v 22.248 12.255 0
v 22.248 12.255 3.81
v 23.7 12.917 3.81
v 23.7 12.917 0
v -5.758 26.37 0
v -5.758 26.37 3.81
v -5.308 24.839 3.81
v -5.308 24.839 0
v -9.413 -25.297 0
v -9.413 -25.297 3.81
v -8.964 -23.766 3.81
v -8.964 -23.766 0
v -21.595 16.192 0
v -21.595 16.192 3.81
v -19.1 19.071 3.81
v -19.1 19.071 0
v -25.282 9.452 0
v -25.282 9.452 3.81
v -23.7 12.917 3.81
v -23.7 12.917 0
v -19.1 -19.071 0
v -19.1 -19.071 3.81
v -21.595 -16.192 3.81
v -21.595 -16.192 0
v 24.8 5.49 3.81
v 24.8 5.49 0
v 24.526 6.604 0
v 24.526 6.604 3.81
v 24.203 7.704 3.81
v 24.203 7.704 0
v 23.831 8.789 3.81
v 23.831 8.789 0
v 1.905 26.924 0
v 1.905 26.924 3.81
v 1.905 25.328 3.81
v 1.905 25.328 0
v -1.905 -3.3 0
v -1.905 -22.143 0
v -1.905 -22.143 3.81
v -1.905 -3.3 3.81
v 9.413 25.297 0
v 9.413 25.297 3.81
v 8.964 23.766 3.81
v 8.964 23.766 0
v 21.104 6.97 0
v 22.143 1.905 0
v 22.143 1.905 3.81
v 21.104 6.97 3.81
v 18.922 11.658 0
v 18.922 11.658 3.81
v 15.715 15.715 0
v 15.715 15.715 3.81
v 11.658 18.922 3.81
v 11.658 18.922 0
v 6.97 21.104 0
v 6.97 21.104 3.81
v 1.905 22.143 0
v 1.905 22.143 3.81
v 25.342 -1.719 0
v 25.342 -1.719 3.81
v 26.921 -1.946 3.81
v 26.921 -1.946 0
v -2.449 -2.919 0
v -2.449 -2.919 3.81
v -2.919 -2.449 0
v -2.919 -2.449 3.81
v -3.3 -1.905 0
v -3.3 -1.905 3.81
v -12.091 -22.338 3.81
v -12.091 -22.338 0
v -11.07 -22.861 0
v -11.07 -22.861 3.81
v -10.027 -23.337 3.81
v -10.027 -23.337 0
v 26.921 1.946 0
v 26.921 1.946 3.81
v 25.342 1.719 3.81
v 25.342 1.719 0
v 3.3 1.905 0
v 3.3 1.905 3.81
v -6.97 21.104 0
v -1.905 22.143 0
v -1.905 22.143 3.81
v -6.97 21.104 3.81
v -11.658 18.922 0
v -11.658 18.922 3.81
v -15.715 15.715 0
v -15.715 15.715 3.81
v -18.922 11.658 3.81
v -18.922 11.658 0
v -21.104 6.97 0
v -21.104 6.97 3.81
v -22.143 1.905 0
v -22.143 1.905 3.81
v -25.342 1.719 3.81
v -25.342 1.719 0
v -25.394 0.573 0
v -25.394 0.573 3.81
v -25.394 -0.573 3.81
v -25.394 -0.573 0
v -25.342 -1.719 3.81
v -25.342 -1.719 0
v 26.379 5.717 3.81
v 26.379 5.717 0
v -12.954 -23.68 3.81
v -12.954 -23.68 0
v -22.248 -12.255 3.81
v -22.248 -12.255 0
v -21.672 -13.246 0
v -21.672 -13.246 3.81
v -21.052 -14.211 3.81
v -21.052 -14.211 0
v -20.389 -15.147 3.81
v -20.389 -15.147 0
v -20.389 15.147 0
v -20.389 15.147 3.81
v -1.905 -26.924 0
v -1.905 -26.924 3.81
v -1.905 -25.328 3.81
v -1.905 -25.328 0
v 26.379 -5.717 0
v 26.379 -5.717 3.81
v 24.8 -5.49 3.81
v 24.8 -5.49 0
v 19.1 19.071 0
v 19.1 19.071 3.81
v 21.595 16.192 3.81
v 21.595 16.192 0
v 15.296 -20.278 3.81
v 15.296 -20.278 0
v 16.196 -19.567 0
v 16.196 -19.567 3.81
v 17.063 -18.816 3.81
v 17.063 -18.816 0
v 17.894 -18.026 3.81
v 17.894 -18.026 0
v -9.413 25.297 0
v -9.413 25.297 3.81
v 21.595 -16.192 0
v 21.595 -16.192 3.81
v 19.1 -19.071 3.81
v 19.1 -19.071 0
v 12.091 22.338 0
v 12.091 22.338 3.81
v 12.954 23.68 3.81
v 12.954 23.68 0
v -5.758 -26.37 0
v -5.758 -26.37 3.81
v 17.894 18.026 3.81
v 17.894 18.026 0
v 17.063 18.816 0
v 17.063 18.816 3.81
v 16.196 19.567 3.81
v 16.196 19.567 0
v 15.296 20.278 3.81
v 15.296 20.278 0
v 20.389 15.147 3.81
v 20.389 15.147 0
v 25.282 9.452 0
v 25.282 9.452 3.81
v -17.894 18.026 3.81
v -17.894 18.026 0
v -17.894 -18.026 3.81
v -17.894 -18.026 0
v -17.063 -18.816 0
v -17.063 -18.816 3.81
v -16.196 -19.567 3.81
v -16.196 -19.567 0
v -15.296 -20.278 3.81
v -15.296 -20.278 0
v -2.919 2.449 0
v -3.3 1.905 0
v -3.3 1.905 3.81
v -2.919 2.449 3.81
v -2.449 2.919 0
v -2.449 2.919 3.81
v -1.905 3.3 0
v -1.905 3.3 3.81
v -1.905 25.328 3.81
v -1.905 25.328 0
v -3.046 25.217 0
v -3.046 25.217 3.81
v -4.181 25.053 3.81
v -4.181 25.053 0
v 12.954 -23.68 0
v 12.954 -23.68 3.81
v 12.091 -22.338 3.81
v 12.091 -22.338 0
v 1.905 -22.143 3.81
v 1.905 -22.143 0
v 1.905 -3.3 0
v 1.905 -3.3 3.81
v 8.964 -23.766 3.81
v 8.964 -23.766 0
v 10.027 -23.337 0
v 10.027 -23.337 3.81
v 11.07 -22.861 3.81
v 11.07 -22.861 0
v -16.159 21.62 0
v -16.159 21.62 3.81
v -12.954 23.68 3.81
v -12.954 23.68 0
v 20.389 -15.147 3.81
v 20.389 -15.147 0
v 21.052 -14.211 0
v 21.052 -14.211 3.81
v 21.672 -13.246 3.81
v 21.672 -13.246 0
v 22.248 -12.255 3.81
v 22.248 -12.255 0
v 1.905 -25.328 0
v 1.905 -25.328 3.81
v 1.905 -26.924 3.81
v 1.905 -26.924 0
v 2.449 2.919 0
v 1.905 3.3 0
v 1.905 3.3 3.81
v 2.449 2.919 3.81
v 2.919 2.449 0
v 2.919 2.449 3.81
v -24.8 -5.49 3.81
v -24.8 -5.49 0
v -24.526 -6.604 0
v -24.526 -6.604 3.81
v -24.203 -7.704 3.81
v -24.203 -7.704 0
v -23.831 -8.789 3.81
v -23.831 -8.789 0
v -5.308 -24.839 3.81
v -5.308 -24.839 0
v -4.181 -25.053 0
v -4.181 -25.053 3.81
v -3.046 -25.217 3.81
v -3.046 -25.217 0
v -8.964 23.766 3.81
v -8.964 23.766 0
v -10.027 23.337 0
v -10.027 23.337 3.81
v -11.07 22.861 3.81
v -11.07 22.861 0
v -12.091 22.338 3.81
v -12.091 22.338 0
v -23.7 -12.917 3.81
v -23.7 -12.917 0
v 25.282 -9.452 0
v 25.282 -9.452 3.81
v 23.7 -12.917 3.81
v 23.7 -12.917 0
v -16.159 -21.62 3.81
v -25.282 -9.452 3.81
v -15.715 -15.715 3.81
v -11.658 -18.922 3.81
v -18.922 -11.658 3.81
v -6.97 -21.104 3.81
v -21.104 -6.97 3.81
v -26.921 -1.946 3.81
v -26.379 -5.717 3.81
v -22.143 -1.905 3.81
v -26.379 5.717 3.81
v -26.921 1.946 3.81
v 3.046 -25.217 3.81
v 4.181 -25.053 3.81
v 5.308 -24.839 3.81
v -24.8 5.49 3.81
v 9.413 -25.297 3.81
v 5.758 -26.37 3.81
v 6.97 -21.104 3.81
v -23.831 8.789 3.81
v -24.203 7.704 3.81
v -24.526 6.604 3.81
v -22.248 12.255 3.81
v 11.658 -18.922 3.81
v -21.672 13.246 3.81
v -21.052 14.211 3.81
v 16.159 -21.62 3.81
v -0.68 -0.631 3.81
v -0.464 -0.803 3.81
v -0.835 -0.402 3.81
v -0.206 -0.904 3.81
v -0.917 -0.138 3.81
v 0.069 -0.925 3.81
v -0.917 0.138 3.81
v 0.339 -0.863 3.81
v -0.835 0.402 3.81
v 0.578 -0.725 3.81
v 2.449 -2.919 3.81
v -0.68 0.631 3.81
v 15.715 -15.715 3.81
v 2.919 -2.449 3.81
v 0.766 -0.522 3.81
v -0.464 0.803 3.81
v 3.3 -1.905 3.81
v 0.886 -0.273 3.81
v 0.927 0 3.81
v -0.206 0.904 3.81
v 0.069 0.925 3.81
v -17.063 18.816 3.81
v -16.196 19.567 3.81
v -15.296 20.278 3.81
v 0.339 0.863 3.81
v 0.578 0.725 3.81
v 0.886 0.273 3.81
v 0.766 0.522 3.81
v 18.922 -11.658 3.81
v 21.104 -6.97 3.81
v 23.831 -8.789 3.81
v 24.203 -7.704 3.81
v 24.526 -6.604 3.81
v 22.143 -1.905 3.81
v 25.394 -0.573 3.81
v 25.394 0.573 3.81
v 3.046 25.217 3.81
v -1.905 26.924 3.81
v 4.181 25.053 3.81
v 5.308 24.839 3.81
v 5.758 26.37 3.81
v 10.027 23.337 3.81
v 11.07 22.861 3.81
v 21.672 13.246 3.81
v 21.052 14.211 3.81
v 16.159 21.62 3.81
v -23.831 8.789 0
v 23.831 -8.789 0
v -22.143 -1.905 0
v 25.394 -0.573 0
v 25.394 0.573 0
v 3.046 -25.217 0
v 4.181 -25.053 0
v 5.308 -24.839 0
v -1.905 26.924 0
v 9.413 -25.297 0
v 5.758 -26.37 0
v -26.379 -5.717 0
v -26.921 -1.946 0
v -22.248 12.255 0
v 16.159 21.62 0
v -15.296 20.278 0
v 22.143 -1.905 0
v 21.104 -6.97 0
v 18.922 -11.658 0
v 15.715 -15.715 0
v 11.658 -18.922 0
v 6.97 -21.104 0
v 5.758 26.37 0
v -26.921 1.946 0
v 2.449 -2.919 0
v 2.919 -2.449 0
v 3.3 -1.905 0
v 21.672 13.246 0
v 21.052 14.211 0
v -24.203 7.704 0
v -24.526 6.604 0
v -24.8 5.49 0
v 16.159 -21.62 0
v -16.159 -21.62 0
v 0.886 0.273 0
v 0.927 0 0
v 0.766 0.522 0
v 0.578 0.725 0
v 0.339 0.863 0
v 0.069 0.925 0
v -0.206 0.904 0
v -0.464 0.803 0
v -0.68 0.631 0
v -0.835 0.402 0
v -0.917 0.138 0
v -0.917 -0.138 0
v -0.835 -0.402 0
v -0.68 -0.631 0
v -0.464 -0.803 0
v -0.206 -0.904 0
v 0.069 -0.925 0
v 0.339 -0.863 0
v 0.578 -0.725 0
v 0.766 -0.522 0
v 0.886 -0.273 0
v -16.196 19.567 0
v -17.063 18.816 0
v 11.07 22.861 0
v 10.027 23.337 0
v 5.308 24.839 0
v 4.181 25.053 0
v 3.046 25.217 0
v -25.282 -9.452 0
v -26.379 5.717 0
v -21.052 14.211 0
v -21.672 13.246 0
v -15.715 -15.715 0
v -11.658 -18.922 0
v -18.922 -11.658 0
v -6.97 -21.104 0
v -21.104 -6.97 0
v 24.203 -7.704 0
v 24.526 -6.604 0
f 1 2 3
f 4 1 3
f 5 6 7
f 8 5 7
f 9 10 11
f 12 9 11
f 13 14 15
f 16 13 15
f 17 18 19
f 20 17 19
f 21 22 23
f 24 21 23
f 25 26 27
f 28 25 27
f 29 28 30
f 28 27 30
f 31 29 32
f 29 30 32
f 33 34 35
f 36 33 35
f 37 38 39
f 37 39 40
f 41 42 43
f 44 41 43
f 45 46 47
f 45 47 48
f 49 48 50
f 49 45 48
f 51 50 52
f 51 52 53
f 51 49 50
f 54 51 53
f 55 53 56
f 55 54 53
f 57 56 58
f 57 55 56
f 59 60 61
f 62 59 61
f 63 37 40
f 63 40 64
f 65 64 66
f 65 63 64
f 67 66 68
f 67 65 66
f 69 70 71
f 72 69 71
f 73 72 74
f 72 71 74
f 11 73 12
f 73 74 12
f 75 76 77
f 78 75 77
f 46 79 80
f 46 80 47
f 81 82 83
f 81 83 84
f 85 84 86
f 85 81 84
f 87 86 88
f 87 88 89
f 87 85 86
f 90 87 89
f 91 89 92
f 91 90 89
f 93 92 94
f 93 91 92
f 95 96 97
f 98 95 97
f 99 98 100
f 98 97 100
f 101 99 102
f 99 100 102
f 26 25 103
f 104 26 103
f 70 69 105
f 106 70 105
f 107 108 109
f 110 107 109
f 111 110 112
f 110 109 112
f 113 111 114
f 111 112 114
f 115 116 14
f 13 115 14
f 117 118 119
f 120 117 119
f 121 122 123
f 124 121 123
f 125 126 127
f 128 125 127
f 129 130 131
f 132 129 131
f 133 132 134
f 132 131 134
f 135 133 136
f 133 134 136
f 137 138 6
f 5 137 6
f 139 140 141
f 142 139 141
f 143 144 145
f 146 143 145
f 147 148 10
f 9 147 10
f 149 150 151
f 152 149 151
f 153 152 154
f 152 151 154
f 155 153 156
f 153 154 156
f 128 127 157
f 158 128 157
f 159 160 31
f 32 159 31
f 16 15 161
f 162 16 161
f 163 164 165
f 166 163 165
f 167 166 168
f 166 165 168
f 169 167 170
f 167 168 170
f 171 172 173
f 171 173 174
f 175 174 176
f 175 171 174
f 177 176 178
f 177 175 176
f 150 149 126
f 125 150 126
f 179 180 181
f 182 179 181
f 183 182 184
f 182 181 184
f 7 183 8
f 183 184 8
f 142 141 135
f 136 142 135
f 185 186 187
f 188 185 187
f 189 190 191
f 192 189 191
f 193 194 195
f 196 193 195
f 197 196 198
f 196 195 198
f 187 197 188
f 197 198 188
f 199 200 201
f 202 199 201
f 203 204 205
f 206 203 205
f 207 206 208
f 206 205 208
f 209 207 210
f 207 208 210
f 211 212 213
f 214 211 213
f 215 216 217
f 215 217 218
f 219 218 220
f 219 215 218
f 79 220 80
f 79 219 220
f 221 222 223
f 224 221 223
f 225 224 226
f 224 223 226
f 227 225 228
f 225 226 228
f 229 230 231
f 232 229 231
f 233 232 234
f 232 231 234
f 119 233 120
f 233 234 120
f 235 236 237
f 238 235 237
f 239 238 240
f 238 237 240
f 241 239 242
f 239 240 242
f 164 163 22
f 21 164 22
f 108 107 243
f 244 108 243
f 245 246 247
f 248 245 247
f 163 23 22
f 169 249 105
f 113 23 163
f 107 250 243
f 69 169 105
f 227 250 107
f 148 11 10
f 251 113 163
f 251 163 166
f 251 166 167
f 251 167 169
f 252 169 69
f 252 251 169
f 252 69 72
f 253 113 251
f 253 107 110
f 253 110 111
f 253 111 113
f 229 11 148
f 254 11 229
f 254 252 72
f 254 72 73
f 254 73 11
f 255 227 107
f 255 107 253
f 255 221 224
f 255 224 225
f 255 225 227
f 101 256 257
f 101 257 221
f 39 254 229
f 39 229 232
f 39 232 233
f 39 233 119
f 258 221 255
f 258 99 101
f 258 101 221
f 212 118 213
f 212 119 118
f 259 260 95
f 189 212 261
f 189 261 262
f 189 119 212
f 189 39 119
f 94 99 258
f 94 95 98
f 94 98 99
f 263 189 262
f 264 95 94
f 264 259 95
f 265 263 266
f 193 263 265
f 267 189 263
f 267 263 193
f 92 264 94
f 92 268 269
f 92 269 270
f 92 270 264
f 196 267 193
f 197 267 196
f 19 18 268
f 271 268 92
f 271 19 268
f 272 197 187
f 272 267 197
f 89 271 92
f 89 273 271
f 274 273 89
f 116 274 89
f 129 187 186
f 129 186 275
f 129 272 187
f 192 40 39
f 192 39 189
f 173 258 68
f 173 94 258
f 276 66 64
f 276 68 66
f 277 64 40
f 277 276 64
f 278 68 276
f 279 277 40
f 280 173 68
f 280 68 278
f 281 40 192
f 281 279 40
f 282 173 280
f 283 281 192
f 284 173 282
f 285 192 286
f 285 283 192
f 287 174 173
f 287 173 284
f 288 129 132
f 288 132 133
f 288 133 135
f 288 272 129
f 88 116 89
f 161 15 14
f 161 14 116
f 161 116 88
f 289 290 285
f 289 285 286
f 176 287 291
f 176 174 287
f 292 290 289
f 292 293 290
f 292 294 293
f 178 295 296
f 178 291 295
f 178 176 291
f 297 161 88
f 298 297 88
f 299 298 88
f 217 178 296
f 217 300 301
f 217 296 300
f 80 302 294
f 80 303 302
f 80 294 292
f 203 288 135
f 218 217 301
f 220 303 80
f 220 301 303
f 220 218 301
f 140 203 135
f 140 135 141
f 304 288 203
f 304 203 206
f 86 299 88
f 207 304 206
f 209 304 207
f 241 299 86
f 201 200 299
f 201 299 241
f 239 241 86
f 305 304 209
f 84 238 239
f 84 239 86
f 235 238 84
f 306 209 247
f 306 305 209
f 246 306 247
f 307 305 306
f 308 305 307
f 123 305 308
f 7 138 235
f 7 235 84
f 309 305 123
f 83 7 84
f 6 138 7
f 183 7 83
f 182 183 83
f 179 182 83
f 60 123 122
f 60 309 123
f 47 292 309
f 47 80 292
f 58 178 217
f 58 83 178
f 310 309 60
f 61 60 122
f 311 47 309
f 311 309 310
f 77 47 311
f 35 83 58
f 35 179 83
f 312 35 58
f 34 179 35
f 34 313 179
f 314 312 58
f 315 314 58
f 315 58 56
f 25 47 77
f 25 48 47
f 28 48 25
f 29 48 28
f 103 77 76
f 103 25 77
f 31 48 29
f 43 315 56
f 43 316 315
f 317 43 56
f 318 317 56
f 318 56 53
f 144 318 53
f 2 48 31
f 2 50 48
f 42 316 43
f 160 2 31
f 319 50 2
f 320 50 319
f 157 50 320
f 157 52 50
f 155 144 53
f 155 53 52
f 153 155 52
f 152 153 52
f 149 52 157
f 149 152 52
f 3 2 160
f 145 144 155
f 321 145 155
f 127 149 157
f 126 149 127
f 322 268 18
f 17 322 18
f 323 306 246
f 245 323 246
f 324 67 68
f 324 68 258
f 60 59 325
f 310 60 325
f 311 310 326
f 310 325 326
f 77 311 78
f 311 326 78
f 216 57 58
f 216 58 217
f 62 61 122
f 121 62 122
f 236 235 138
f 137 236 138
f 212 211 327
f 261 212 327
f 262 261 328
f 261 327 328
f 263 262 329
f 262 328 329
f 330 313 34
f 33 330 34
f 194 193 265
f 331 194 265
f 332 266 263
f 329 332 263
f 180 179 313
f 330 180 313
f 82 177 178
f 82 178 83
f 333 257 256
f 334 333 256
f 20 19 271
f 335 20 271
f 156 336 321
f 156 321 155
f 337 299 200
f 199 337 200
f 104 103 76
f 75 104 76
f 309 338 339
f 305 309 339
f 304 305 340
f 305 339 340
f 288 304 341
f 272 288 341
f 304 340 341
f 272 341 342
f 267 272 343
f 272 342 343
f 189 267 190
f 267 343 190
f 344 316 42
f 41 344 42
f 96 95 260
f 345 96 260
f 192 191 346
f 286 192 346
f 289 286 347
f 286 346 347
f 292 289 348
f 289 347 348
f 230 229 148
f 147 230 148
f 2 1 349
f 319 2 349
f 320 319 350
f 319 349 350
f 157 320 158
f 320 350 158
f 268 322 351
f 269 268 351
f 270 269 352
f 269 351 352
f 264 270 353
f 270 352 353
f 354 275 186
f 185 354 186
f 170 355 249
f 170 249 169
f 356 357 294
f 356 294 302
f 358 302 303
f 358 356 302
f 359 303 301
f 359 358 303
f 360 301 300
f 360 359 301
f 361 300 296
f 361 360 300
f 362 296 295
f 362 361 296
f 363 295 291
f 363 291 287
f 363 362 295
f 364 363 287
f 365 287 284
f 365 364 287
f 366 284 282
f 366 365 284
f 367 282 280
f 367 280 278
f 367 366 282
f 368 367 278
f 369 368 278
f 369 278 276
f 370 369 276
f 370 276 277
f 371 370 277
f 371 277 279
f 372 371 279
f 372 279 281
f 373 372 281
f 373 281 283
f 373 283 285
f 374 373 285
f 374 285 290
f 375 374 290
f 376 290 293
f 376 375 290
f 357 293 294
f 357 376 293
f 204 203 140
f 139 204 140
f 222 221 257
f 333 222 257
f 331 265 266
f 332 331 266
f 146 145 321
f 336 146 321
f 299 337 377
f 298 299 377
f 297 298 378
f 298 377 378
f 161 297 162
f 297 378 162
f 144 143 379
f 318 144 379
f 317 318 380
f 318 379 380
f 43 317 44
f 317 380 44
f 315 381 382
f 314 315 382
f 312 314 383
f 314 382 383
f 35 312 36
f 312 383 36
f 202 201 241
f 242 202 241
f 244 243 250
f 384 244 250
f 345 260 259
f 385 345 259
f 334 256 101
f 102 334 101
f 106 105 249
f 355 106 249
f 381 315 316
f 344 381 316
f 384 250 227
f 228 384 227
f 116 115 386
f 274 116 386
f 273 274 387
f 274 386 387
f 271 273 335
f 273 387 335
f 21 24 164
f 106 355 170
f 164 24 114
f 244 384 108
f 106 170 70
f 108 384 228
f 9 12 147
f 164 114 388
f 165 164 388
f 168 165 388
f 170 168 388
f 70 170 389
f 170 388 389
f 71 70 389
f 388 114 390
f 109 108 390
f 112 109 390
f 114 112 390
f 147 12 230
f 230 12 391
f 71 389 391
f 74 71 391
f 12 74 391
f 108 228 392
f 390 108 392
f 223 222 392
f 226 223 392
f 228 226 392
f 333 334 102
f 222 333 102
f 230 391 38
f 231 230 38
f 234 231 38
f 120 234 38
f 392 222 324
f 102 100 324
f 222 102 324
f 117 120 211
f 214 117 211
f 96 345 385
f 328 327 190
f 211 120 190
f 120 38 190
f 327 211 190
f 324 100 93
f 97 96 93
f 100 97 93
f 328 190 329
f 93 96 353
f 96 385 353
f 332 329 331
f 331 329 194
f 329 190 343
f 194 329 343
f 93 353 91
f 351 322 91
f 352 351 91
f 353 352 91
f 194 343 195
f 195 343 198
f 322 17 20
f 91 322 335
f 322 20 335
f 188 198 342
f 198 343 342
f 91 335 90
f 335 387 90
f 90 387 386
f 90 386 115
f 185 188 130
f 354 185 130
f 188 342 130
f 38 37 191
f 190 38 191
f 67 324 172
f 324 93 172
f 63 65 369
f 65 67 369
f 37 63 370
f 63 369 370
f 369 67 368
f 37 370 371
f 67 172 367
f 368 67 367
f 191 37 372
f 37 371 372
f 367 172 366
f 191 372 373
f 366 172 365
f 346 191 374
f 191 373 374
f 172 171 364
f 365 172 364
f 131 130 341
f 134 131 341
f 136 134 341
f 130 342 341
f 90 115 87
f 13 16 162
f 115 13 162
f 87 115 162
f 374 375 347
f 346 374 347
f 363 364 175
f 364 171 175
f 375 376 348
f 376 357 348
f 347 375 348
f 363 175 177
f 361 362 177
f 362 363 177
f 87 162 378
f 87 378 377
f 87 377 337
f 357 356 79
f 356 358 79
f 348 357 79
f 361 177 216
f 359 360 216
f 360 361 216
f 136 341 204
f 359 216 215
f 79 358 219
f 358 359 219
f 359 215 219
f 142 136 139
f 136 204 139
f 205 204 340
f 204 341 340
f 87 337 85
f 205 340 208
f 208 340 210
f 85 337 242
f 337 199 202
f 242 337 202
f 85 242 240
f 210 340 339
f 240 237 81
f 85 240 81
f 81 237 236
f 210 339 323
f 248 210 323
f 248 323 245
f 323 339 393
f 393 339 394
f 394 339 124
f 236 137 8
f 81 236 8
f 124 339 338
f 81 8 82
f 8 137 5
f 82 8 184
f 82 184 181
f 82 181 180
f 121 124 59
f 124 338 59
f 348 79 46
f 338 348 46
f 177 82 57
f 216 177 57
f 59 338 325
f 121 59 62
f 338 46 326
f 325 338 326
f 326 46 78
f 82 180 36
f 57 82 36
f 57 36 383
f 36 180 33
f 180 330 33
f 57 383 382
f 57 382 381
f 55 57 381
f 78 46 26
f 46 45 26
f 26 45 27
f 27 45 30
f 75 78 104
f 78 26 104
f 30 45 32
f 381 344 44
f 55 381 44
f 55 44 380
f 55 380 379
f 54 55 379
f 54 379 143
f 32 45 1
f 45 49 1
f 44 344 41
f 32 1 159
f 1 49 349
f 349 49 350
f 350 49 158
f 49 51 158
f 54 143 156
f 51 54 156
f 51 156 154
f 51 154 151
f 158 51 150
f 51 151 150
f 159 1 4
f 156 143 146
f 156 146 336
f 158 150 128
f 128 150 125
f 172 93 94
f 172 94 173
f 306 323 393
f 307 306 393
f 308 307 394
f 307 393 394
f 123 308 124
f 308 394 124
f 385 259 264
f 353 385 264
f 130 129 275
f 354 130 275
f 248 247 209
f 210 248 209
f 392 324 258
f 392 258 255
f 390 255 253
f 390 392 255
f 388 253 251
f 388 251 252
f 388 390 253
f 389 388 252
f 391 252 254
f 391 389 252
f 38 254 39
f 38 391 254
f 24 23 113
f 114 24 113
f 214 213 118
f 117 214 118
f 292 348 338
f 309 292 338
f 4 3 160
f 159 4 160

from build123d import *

# Parameters (mm, degrees)
SKETCH1_R           = 25.4
SKETCH1_R_2         = 0.9271
BOSS_EXTRUDE1_DEPTH = 3.81
BOSS_EXTRUDE2_DEPTH = 3.81


with BuildPart() as part:
    # Sketch1 → Boss-Extrude1 (new body)
    with BuildSketch(Plane.XY):
        Circle(SKETCH1_R)
        Circle(SKETCH1_R_2, mode=Mode.SUBTRACT)
        with BuildLine():
            Line((-1.905, 3.299556788), (-1.905, 22.143206633))
            ThreePointArc((-1.905, 22.143206633), (-15.715448212, 15.715448212), (-22.143206633, 1.905))
            Line((-22.143206633, 1.905), (-3.299556788, 1.905))
            ThreePointArc((-3.299556788, 1.905), (-2.694076836, 2.694076836), (-1.905, 3.299556788))
        make_face(mode=Mode.SUBTRACT)
        with BuildLine():
            Line((1.905, -22.143206633), (1.905, -3.299556788))
            ThreePointArc((1.905, -3.299556788), (2.694076836, -2.694076836), (3.299556788, -1.905))
            Line((3.299556788, -1.905), (22.143206633, -1.905))
            ThreePointArc((22.143206633, -1.905), (15.715448212, -15.715448212), (1.905, -22.143206633))
        make_face(mode=Mode.SUBTRACT)
        with BuildLine():
            Line((-1.905, -22.143206633), (-1.905, -3.299556788))
            ThreePointArc((-1.905, -3.299556788), (-2.694076836, -2.694076836), (-3.299556788, -1.905))
            Line((-3.299556788, -1.905), (-22.143206633, -1.905))
            ThreePointArc((-22.143206633, -1.905), (-15.715448212, -15.715448212), (-1.905, -22.143206633))
        make_face(mode=Mode.SUBTRACT)
        with BuildLine():
            Line((3.299556788, 1.905), (22.143206633, 1.905))
            ThreePointArc((22.143206633, 1.905), (15.715448212, 15.715448212), (1.905, 22.143206633))
            Line((1.905, 22.143206633), (1.905, 3.299556788))
            ThreePointArc((1.905, 3.299556788), (2.694076836, 2.694076836), (3.299556788, 1.905))
        make_face(mode=Mode.SUBTRACT)
    extrude(amount=BOSS_EXTRUDE1_DEPTH)

    # Sketch2 → Boss-Extrude2 (add)
    with BuildSketch(Plane.XY.offset(3.81)):
        with BuildLine():
            Line((5.308018177, 24.83918161), (5.757533246, 26.370089342))
            Line((5.757533246, 26.370089342), (9.413201475, 25.296688301))
            Line((9.413201475, 25.296688301), (8.963686407, 23.765780568))
            ThreePointArc((8.963686407, 23.765780568), (7.156006944, 24.37112153), (5.308018177, 24.83918161))
        make_face()
        with BuildLine():
            Line((-1.905, 25.328461757), (-1.905, 26.924))
            Line((-1.905, 26.924), (1.905, 26.924))
            Line((1.905, 26.924), (1.905, 25.328461757))
            ThreePointArc((1.905, 25.328461757), (0, 25.4), (-1.905, 25.328461757))
        make_face()
        with BuildLine():
            Line((12.091012289, 22.337578692), (12.953625389, 23.679830875))
            Line((12.953625389, 23.679830875), (16.158801349, 21.619989361))
            Line((16.158801349, 21.619989361), (15.296188249, 20.277737177))
            ThreePointArc((15.296188249, 20.277737177), (13.732276763, 21.367839734), (12.091012289, 22.337578692))
        make_face()
        with BuildLine():
            Line((17.894464494, 18.026317995), (19.100291842, 19.07117334))
            Line((19.100291842, 19.07117334), (21.595311238, 16.191767462))
            Line((21.595311238, 16.191767462), (20.38948389, 15.146912117))
            ThreePointArc((20.38948389, 15.146912117), (19.196039189, 16.633462642), (17.894464494, 18.026317995))
        make_face()
        with BuildLine():
            Line((22.248213608, 12.254672221), (23.699566243, 12.917482761))
            Line((23.699566243, 12.917482761), (25.282297443, 9.451784859))
            Line((25.282297443, 9.451784859), (23.830944807, 8.788974319))
            ThreePointArc((23.830944807, 8.788974319), (23.104652682, 10.55154133), (22.248213608, 12.254672221))
        make_face()
        with BuildLine():
            Line((24.79954477, 5.490225786), (26.378842734, 5.717294552))
            Line((26.378842734, 5.717294552), (26.921062268, 1.946074859))
            Line((26.921062268, 1.946074859), (25.341764304, 1.719006092))
            ThreePointArc((25.341764304, 1.719006092), (25.141464624, 3.614796892), (24.79954477, 5.490225786))
        make_face()
        with BuildLine():
            Line((25.341764304, -1.719006092), (26.921062268, -1.946074859))
            Line((26.921062268, -1.946074859), (26.378842734, -5.717294552))
            Line((26.378842734, -5.717294552), (24.79954477, -5.490225786))
            ThreePointArc((24.79954477, -5.490225786), (25.141464624, -3.614796892), (25.341764304, -1.719006092))
        make_face()
        with BuildLine():
            Line((23.830944807, -8.788974319), (25.282297443, -9.451784859))
            Line((25.282297443, -9.451784859), (23.699566243, -12.917482761))
            Line((23.699566243, -12.917482761), (22.248213608, -12.254672221))
            ThreePointArc((22.248213608, -12.254672221), (23.104652682, -10.55154133), (23.830944807, -8.788974319))
        make_face()
        with BuildLine():
            Line((20.38948389, -15.146912117), (21.595311238, -16.191767462))
            Line((21.595311238, -16.191767462), (19.100291842, -19.07117334))
            Line((19.100291842, -19.07117334), (17.894464494, -18.026317995))
            ThreePointArc((17.894464494, -18.026317995), (19.196039189, -16.633462642), (20.38948389, -15.146912117))
        make_face()
        with BuildLine():
            Line((15.296188249, -20.277737177), (16.158801349, -21.619989361))
            Line((16.158801349, -21.619989361), (12.953625389, -23.679830875))
            Line((12.953625389, -23.679830875), (12.091012289, -22.337578692))
            ThreePointArc((12.091012289, -22.337578692), (13.732276763, -21.367839734), (15.296188249, -20.277737177))
        make_face()
        with BuildLine():
            Line((8.963686407, -23.765780568), (9.413201475, -25.296688301))
            Line((9.413201475, -25.296688301), (5.757533246, -26.370089342))
            Line((5.757533246, -26.370089342), (5.308018177, -24.83918161))
            ThreePointArc((5.308018177, -24.83918161), (7.156006944, -24.37112153), (8.963686407, -23.765780568))
        make_face()
        with BuildLine():
            Line((1.905, -25.328461757), (1.905, -26.924))
            Line((1.905, -26.924), (-1.905, -26.924))
            Line((-1.905, -26.924), (-1.905, -25.328461757))
            ThreePointArc((-1.905, -25.328461757), (0, -25.4), (1.905, -25.328461757))
        make_face()
        with BuildLine():
            Line((-5.308018177, -24.83918161), (-5.757533246, -26.370089342))
            Line((-5.757533246, -26.370089342), (-9.413201475, -25.296688301))
            Line((-9.413201475, -25.296688301), (-8.963686407, -23.765780568))
            ThreePointArc((-8.963686407, -23.765780568), (-7.156006944, -24.37112153), (-5.308018177, -24.83918161))
        make_face()
        with BuildLine():
            Line((-12.091012289, -22.337578692), (-12.953625389, -23.679830875))
            Line((-12.953625389, -23.679830875), (-16.158801349, -21.619989361))
            Line((-16.158801349, -21.619989361), (-15.296188249, -20.277737177))
            ThreePointArc((-15.296188249, -20.277737177), (-13.732276763, -21.367839734), (-12.091012289, -22.337578692))
        make_face()
        with BuildLine():
            Line((-17.894464494, -18.026317995), (-19.100291842, -19.07117334))
            Line((-19.100291842, -19.07117334), (-21.595311238, -16.191767462))
            Line((-21.595311238, -16.191767462), (-20.38948389, -15.146912117))
            ThreePointArc((-20.38948389, -15.146912117), (-19.196039189, -16.633462642), (-17.894464494, -18.026317995))
        make_face()
        with BuildLine():
            Line((-22.248213608, -12.254672221), (-23.699566243, -12.917482761))
            Line((-23.699566243, -12.917482761), (-25.282297443, -9.451784859))
            Line((-25.282297443, -9.451784859), (-23.830944807, -8.788974319))
            ThreePointArc((-23.830944807, -8.788974319), (-23.104652682, -10.55154133), (-22.248213608, -12.254672221))
        make_face()
        with BuildLine():
            Line((-24.79954477, -5.490225786), (-26.378842734, -5.717294552))
            Line((-26.378842734, -5.717294552), (-26.921062268, -1.946074859))
            Line((-26.921062268, -1.946074859), (-25.341764304, -1.719006092))
            ThreePointArc((-25.341764304, -1.719006092), (-25.141464624, -3.614796892), (-24.79954477, -5.490225786))
        make_face()
        with BuildLine():
            Line((-25.341764304, 1.719006092), (-26.921062268, 1.946074859))
            Line((-26.921062268, 1.946074859), (-26.378842734, 5.717294552))
            Line((-26.378842734, 5.717294552), (-24.79954477, 5.490225786))
            ThreePointArc((-24.79954477, 5.490225786), (-25.141464624, 3.614796892), (-25.341764304, 1.719006092))
        make_face()
        with BuildLine():
            Line((-23.830944807, 8.788974319), (-25.282297443, 9.451784859))
            Line((-25.282297443, 9.451784859), (-23.699566243, 12.917482761))
            Line((-23.699566243, 12.917482761), (-22.248213608, 12.254672221))
            ThreePointArc((-22.248213608, 12.254672221), (-23.104652682, 10.55154133), (-23.830944807, 8.788974319))
        make_face()
        with BuildLine():
            Line((-20.38948389, 15.146912117), (-21.595311238, 16.191767462))
            Line((-21.595311238, 16.191767462), (-19.100291842, 19.07117334))
            Line((-19.100291842, 19.07117334), (-17.894464494, 18.026317995))
            ThreePointArc((-17.894464494, 18.026317995), (-19.196039189, 16.633462642), (-20.38948389, 15.146912117))
        make_face()
        with BuildLine():
            Line((-15.296188249, 20.277737177), (-16.158801349, 21.619989361))
            Line((-16.158801349, 21.619989361), (-12.953625389, 23.679830875))
            Line((-12.953625389, 23.679830875), (-12.091012289, 22.337578692))
            ThreePointArc((-12.091012289, 22.337578692), (-13.732276763, 21.367839734), (-15.296188249, 20.277737177))
        make_face()
        with BuildLine():
            Line((-8.963686407, 23.765780568), (-9.413201475, 25.296688301))
            Line((-9.413201475, 25.296688301), (-5.757533246, 26.370089342))
            Line((-5.757533246, 26.370089342), (-5.308018177, 24.83918161))
            ThreePointArc((-5.308018177, 24.83918161), (-7.156006944, 24.37112153), (-8.963686407, 23.765780568))
        make_face()
    extrude(amount=-BOSS_EXTRUDE2_DEPTH)


solid = part.part
